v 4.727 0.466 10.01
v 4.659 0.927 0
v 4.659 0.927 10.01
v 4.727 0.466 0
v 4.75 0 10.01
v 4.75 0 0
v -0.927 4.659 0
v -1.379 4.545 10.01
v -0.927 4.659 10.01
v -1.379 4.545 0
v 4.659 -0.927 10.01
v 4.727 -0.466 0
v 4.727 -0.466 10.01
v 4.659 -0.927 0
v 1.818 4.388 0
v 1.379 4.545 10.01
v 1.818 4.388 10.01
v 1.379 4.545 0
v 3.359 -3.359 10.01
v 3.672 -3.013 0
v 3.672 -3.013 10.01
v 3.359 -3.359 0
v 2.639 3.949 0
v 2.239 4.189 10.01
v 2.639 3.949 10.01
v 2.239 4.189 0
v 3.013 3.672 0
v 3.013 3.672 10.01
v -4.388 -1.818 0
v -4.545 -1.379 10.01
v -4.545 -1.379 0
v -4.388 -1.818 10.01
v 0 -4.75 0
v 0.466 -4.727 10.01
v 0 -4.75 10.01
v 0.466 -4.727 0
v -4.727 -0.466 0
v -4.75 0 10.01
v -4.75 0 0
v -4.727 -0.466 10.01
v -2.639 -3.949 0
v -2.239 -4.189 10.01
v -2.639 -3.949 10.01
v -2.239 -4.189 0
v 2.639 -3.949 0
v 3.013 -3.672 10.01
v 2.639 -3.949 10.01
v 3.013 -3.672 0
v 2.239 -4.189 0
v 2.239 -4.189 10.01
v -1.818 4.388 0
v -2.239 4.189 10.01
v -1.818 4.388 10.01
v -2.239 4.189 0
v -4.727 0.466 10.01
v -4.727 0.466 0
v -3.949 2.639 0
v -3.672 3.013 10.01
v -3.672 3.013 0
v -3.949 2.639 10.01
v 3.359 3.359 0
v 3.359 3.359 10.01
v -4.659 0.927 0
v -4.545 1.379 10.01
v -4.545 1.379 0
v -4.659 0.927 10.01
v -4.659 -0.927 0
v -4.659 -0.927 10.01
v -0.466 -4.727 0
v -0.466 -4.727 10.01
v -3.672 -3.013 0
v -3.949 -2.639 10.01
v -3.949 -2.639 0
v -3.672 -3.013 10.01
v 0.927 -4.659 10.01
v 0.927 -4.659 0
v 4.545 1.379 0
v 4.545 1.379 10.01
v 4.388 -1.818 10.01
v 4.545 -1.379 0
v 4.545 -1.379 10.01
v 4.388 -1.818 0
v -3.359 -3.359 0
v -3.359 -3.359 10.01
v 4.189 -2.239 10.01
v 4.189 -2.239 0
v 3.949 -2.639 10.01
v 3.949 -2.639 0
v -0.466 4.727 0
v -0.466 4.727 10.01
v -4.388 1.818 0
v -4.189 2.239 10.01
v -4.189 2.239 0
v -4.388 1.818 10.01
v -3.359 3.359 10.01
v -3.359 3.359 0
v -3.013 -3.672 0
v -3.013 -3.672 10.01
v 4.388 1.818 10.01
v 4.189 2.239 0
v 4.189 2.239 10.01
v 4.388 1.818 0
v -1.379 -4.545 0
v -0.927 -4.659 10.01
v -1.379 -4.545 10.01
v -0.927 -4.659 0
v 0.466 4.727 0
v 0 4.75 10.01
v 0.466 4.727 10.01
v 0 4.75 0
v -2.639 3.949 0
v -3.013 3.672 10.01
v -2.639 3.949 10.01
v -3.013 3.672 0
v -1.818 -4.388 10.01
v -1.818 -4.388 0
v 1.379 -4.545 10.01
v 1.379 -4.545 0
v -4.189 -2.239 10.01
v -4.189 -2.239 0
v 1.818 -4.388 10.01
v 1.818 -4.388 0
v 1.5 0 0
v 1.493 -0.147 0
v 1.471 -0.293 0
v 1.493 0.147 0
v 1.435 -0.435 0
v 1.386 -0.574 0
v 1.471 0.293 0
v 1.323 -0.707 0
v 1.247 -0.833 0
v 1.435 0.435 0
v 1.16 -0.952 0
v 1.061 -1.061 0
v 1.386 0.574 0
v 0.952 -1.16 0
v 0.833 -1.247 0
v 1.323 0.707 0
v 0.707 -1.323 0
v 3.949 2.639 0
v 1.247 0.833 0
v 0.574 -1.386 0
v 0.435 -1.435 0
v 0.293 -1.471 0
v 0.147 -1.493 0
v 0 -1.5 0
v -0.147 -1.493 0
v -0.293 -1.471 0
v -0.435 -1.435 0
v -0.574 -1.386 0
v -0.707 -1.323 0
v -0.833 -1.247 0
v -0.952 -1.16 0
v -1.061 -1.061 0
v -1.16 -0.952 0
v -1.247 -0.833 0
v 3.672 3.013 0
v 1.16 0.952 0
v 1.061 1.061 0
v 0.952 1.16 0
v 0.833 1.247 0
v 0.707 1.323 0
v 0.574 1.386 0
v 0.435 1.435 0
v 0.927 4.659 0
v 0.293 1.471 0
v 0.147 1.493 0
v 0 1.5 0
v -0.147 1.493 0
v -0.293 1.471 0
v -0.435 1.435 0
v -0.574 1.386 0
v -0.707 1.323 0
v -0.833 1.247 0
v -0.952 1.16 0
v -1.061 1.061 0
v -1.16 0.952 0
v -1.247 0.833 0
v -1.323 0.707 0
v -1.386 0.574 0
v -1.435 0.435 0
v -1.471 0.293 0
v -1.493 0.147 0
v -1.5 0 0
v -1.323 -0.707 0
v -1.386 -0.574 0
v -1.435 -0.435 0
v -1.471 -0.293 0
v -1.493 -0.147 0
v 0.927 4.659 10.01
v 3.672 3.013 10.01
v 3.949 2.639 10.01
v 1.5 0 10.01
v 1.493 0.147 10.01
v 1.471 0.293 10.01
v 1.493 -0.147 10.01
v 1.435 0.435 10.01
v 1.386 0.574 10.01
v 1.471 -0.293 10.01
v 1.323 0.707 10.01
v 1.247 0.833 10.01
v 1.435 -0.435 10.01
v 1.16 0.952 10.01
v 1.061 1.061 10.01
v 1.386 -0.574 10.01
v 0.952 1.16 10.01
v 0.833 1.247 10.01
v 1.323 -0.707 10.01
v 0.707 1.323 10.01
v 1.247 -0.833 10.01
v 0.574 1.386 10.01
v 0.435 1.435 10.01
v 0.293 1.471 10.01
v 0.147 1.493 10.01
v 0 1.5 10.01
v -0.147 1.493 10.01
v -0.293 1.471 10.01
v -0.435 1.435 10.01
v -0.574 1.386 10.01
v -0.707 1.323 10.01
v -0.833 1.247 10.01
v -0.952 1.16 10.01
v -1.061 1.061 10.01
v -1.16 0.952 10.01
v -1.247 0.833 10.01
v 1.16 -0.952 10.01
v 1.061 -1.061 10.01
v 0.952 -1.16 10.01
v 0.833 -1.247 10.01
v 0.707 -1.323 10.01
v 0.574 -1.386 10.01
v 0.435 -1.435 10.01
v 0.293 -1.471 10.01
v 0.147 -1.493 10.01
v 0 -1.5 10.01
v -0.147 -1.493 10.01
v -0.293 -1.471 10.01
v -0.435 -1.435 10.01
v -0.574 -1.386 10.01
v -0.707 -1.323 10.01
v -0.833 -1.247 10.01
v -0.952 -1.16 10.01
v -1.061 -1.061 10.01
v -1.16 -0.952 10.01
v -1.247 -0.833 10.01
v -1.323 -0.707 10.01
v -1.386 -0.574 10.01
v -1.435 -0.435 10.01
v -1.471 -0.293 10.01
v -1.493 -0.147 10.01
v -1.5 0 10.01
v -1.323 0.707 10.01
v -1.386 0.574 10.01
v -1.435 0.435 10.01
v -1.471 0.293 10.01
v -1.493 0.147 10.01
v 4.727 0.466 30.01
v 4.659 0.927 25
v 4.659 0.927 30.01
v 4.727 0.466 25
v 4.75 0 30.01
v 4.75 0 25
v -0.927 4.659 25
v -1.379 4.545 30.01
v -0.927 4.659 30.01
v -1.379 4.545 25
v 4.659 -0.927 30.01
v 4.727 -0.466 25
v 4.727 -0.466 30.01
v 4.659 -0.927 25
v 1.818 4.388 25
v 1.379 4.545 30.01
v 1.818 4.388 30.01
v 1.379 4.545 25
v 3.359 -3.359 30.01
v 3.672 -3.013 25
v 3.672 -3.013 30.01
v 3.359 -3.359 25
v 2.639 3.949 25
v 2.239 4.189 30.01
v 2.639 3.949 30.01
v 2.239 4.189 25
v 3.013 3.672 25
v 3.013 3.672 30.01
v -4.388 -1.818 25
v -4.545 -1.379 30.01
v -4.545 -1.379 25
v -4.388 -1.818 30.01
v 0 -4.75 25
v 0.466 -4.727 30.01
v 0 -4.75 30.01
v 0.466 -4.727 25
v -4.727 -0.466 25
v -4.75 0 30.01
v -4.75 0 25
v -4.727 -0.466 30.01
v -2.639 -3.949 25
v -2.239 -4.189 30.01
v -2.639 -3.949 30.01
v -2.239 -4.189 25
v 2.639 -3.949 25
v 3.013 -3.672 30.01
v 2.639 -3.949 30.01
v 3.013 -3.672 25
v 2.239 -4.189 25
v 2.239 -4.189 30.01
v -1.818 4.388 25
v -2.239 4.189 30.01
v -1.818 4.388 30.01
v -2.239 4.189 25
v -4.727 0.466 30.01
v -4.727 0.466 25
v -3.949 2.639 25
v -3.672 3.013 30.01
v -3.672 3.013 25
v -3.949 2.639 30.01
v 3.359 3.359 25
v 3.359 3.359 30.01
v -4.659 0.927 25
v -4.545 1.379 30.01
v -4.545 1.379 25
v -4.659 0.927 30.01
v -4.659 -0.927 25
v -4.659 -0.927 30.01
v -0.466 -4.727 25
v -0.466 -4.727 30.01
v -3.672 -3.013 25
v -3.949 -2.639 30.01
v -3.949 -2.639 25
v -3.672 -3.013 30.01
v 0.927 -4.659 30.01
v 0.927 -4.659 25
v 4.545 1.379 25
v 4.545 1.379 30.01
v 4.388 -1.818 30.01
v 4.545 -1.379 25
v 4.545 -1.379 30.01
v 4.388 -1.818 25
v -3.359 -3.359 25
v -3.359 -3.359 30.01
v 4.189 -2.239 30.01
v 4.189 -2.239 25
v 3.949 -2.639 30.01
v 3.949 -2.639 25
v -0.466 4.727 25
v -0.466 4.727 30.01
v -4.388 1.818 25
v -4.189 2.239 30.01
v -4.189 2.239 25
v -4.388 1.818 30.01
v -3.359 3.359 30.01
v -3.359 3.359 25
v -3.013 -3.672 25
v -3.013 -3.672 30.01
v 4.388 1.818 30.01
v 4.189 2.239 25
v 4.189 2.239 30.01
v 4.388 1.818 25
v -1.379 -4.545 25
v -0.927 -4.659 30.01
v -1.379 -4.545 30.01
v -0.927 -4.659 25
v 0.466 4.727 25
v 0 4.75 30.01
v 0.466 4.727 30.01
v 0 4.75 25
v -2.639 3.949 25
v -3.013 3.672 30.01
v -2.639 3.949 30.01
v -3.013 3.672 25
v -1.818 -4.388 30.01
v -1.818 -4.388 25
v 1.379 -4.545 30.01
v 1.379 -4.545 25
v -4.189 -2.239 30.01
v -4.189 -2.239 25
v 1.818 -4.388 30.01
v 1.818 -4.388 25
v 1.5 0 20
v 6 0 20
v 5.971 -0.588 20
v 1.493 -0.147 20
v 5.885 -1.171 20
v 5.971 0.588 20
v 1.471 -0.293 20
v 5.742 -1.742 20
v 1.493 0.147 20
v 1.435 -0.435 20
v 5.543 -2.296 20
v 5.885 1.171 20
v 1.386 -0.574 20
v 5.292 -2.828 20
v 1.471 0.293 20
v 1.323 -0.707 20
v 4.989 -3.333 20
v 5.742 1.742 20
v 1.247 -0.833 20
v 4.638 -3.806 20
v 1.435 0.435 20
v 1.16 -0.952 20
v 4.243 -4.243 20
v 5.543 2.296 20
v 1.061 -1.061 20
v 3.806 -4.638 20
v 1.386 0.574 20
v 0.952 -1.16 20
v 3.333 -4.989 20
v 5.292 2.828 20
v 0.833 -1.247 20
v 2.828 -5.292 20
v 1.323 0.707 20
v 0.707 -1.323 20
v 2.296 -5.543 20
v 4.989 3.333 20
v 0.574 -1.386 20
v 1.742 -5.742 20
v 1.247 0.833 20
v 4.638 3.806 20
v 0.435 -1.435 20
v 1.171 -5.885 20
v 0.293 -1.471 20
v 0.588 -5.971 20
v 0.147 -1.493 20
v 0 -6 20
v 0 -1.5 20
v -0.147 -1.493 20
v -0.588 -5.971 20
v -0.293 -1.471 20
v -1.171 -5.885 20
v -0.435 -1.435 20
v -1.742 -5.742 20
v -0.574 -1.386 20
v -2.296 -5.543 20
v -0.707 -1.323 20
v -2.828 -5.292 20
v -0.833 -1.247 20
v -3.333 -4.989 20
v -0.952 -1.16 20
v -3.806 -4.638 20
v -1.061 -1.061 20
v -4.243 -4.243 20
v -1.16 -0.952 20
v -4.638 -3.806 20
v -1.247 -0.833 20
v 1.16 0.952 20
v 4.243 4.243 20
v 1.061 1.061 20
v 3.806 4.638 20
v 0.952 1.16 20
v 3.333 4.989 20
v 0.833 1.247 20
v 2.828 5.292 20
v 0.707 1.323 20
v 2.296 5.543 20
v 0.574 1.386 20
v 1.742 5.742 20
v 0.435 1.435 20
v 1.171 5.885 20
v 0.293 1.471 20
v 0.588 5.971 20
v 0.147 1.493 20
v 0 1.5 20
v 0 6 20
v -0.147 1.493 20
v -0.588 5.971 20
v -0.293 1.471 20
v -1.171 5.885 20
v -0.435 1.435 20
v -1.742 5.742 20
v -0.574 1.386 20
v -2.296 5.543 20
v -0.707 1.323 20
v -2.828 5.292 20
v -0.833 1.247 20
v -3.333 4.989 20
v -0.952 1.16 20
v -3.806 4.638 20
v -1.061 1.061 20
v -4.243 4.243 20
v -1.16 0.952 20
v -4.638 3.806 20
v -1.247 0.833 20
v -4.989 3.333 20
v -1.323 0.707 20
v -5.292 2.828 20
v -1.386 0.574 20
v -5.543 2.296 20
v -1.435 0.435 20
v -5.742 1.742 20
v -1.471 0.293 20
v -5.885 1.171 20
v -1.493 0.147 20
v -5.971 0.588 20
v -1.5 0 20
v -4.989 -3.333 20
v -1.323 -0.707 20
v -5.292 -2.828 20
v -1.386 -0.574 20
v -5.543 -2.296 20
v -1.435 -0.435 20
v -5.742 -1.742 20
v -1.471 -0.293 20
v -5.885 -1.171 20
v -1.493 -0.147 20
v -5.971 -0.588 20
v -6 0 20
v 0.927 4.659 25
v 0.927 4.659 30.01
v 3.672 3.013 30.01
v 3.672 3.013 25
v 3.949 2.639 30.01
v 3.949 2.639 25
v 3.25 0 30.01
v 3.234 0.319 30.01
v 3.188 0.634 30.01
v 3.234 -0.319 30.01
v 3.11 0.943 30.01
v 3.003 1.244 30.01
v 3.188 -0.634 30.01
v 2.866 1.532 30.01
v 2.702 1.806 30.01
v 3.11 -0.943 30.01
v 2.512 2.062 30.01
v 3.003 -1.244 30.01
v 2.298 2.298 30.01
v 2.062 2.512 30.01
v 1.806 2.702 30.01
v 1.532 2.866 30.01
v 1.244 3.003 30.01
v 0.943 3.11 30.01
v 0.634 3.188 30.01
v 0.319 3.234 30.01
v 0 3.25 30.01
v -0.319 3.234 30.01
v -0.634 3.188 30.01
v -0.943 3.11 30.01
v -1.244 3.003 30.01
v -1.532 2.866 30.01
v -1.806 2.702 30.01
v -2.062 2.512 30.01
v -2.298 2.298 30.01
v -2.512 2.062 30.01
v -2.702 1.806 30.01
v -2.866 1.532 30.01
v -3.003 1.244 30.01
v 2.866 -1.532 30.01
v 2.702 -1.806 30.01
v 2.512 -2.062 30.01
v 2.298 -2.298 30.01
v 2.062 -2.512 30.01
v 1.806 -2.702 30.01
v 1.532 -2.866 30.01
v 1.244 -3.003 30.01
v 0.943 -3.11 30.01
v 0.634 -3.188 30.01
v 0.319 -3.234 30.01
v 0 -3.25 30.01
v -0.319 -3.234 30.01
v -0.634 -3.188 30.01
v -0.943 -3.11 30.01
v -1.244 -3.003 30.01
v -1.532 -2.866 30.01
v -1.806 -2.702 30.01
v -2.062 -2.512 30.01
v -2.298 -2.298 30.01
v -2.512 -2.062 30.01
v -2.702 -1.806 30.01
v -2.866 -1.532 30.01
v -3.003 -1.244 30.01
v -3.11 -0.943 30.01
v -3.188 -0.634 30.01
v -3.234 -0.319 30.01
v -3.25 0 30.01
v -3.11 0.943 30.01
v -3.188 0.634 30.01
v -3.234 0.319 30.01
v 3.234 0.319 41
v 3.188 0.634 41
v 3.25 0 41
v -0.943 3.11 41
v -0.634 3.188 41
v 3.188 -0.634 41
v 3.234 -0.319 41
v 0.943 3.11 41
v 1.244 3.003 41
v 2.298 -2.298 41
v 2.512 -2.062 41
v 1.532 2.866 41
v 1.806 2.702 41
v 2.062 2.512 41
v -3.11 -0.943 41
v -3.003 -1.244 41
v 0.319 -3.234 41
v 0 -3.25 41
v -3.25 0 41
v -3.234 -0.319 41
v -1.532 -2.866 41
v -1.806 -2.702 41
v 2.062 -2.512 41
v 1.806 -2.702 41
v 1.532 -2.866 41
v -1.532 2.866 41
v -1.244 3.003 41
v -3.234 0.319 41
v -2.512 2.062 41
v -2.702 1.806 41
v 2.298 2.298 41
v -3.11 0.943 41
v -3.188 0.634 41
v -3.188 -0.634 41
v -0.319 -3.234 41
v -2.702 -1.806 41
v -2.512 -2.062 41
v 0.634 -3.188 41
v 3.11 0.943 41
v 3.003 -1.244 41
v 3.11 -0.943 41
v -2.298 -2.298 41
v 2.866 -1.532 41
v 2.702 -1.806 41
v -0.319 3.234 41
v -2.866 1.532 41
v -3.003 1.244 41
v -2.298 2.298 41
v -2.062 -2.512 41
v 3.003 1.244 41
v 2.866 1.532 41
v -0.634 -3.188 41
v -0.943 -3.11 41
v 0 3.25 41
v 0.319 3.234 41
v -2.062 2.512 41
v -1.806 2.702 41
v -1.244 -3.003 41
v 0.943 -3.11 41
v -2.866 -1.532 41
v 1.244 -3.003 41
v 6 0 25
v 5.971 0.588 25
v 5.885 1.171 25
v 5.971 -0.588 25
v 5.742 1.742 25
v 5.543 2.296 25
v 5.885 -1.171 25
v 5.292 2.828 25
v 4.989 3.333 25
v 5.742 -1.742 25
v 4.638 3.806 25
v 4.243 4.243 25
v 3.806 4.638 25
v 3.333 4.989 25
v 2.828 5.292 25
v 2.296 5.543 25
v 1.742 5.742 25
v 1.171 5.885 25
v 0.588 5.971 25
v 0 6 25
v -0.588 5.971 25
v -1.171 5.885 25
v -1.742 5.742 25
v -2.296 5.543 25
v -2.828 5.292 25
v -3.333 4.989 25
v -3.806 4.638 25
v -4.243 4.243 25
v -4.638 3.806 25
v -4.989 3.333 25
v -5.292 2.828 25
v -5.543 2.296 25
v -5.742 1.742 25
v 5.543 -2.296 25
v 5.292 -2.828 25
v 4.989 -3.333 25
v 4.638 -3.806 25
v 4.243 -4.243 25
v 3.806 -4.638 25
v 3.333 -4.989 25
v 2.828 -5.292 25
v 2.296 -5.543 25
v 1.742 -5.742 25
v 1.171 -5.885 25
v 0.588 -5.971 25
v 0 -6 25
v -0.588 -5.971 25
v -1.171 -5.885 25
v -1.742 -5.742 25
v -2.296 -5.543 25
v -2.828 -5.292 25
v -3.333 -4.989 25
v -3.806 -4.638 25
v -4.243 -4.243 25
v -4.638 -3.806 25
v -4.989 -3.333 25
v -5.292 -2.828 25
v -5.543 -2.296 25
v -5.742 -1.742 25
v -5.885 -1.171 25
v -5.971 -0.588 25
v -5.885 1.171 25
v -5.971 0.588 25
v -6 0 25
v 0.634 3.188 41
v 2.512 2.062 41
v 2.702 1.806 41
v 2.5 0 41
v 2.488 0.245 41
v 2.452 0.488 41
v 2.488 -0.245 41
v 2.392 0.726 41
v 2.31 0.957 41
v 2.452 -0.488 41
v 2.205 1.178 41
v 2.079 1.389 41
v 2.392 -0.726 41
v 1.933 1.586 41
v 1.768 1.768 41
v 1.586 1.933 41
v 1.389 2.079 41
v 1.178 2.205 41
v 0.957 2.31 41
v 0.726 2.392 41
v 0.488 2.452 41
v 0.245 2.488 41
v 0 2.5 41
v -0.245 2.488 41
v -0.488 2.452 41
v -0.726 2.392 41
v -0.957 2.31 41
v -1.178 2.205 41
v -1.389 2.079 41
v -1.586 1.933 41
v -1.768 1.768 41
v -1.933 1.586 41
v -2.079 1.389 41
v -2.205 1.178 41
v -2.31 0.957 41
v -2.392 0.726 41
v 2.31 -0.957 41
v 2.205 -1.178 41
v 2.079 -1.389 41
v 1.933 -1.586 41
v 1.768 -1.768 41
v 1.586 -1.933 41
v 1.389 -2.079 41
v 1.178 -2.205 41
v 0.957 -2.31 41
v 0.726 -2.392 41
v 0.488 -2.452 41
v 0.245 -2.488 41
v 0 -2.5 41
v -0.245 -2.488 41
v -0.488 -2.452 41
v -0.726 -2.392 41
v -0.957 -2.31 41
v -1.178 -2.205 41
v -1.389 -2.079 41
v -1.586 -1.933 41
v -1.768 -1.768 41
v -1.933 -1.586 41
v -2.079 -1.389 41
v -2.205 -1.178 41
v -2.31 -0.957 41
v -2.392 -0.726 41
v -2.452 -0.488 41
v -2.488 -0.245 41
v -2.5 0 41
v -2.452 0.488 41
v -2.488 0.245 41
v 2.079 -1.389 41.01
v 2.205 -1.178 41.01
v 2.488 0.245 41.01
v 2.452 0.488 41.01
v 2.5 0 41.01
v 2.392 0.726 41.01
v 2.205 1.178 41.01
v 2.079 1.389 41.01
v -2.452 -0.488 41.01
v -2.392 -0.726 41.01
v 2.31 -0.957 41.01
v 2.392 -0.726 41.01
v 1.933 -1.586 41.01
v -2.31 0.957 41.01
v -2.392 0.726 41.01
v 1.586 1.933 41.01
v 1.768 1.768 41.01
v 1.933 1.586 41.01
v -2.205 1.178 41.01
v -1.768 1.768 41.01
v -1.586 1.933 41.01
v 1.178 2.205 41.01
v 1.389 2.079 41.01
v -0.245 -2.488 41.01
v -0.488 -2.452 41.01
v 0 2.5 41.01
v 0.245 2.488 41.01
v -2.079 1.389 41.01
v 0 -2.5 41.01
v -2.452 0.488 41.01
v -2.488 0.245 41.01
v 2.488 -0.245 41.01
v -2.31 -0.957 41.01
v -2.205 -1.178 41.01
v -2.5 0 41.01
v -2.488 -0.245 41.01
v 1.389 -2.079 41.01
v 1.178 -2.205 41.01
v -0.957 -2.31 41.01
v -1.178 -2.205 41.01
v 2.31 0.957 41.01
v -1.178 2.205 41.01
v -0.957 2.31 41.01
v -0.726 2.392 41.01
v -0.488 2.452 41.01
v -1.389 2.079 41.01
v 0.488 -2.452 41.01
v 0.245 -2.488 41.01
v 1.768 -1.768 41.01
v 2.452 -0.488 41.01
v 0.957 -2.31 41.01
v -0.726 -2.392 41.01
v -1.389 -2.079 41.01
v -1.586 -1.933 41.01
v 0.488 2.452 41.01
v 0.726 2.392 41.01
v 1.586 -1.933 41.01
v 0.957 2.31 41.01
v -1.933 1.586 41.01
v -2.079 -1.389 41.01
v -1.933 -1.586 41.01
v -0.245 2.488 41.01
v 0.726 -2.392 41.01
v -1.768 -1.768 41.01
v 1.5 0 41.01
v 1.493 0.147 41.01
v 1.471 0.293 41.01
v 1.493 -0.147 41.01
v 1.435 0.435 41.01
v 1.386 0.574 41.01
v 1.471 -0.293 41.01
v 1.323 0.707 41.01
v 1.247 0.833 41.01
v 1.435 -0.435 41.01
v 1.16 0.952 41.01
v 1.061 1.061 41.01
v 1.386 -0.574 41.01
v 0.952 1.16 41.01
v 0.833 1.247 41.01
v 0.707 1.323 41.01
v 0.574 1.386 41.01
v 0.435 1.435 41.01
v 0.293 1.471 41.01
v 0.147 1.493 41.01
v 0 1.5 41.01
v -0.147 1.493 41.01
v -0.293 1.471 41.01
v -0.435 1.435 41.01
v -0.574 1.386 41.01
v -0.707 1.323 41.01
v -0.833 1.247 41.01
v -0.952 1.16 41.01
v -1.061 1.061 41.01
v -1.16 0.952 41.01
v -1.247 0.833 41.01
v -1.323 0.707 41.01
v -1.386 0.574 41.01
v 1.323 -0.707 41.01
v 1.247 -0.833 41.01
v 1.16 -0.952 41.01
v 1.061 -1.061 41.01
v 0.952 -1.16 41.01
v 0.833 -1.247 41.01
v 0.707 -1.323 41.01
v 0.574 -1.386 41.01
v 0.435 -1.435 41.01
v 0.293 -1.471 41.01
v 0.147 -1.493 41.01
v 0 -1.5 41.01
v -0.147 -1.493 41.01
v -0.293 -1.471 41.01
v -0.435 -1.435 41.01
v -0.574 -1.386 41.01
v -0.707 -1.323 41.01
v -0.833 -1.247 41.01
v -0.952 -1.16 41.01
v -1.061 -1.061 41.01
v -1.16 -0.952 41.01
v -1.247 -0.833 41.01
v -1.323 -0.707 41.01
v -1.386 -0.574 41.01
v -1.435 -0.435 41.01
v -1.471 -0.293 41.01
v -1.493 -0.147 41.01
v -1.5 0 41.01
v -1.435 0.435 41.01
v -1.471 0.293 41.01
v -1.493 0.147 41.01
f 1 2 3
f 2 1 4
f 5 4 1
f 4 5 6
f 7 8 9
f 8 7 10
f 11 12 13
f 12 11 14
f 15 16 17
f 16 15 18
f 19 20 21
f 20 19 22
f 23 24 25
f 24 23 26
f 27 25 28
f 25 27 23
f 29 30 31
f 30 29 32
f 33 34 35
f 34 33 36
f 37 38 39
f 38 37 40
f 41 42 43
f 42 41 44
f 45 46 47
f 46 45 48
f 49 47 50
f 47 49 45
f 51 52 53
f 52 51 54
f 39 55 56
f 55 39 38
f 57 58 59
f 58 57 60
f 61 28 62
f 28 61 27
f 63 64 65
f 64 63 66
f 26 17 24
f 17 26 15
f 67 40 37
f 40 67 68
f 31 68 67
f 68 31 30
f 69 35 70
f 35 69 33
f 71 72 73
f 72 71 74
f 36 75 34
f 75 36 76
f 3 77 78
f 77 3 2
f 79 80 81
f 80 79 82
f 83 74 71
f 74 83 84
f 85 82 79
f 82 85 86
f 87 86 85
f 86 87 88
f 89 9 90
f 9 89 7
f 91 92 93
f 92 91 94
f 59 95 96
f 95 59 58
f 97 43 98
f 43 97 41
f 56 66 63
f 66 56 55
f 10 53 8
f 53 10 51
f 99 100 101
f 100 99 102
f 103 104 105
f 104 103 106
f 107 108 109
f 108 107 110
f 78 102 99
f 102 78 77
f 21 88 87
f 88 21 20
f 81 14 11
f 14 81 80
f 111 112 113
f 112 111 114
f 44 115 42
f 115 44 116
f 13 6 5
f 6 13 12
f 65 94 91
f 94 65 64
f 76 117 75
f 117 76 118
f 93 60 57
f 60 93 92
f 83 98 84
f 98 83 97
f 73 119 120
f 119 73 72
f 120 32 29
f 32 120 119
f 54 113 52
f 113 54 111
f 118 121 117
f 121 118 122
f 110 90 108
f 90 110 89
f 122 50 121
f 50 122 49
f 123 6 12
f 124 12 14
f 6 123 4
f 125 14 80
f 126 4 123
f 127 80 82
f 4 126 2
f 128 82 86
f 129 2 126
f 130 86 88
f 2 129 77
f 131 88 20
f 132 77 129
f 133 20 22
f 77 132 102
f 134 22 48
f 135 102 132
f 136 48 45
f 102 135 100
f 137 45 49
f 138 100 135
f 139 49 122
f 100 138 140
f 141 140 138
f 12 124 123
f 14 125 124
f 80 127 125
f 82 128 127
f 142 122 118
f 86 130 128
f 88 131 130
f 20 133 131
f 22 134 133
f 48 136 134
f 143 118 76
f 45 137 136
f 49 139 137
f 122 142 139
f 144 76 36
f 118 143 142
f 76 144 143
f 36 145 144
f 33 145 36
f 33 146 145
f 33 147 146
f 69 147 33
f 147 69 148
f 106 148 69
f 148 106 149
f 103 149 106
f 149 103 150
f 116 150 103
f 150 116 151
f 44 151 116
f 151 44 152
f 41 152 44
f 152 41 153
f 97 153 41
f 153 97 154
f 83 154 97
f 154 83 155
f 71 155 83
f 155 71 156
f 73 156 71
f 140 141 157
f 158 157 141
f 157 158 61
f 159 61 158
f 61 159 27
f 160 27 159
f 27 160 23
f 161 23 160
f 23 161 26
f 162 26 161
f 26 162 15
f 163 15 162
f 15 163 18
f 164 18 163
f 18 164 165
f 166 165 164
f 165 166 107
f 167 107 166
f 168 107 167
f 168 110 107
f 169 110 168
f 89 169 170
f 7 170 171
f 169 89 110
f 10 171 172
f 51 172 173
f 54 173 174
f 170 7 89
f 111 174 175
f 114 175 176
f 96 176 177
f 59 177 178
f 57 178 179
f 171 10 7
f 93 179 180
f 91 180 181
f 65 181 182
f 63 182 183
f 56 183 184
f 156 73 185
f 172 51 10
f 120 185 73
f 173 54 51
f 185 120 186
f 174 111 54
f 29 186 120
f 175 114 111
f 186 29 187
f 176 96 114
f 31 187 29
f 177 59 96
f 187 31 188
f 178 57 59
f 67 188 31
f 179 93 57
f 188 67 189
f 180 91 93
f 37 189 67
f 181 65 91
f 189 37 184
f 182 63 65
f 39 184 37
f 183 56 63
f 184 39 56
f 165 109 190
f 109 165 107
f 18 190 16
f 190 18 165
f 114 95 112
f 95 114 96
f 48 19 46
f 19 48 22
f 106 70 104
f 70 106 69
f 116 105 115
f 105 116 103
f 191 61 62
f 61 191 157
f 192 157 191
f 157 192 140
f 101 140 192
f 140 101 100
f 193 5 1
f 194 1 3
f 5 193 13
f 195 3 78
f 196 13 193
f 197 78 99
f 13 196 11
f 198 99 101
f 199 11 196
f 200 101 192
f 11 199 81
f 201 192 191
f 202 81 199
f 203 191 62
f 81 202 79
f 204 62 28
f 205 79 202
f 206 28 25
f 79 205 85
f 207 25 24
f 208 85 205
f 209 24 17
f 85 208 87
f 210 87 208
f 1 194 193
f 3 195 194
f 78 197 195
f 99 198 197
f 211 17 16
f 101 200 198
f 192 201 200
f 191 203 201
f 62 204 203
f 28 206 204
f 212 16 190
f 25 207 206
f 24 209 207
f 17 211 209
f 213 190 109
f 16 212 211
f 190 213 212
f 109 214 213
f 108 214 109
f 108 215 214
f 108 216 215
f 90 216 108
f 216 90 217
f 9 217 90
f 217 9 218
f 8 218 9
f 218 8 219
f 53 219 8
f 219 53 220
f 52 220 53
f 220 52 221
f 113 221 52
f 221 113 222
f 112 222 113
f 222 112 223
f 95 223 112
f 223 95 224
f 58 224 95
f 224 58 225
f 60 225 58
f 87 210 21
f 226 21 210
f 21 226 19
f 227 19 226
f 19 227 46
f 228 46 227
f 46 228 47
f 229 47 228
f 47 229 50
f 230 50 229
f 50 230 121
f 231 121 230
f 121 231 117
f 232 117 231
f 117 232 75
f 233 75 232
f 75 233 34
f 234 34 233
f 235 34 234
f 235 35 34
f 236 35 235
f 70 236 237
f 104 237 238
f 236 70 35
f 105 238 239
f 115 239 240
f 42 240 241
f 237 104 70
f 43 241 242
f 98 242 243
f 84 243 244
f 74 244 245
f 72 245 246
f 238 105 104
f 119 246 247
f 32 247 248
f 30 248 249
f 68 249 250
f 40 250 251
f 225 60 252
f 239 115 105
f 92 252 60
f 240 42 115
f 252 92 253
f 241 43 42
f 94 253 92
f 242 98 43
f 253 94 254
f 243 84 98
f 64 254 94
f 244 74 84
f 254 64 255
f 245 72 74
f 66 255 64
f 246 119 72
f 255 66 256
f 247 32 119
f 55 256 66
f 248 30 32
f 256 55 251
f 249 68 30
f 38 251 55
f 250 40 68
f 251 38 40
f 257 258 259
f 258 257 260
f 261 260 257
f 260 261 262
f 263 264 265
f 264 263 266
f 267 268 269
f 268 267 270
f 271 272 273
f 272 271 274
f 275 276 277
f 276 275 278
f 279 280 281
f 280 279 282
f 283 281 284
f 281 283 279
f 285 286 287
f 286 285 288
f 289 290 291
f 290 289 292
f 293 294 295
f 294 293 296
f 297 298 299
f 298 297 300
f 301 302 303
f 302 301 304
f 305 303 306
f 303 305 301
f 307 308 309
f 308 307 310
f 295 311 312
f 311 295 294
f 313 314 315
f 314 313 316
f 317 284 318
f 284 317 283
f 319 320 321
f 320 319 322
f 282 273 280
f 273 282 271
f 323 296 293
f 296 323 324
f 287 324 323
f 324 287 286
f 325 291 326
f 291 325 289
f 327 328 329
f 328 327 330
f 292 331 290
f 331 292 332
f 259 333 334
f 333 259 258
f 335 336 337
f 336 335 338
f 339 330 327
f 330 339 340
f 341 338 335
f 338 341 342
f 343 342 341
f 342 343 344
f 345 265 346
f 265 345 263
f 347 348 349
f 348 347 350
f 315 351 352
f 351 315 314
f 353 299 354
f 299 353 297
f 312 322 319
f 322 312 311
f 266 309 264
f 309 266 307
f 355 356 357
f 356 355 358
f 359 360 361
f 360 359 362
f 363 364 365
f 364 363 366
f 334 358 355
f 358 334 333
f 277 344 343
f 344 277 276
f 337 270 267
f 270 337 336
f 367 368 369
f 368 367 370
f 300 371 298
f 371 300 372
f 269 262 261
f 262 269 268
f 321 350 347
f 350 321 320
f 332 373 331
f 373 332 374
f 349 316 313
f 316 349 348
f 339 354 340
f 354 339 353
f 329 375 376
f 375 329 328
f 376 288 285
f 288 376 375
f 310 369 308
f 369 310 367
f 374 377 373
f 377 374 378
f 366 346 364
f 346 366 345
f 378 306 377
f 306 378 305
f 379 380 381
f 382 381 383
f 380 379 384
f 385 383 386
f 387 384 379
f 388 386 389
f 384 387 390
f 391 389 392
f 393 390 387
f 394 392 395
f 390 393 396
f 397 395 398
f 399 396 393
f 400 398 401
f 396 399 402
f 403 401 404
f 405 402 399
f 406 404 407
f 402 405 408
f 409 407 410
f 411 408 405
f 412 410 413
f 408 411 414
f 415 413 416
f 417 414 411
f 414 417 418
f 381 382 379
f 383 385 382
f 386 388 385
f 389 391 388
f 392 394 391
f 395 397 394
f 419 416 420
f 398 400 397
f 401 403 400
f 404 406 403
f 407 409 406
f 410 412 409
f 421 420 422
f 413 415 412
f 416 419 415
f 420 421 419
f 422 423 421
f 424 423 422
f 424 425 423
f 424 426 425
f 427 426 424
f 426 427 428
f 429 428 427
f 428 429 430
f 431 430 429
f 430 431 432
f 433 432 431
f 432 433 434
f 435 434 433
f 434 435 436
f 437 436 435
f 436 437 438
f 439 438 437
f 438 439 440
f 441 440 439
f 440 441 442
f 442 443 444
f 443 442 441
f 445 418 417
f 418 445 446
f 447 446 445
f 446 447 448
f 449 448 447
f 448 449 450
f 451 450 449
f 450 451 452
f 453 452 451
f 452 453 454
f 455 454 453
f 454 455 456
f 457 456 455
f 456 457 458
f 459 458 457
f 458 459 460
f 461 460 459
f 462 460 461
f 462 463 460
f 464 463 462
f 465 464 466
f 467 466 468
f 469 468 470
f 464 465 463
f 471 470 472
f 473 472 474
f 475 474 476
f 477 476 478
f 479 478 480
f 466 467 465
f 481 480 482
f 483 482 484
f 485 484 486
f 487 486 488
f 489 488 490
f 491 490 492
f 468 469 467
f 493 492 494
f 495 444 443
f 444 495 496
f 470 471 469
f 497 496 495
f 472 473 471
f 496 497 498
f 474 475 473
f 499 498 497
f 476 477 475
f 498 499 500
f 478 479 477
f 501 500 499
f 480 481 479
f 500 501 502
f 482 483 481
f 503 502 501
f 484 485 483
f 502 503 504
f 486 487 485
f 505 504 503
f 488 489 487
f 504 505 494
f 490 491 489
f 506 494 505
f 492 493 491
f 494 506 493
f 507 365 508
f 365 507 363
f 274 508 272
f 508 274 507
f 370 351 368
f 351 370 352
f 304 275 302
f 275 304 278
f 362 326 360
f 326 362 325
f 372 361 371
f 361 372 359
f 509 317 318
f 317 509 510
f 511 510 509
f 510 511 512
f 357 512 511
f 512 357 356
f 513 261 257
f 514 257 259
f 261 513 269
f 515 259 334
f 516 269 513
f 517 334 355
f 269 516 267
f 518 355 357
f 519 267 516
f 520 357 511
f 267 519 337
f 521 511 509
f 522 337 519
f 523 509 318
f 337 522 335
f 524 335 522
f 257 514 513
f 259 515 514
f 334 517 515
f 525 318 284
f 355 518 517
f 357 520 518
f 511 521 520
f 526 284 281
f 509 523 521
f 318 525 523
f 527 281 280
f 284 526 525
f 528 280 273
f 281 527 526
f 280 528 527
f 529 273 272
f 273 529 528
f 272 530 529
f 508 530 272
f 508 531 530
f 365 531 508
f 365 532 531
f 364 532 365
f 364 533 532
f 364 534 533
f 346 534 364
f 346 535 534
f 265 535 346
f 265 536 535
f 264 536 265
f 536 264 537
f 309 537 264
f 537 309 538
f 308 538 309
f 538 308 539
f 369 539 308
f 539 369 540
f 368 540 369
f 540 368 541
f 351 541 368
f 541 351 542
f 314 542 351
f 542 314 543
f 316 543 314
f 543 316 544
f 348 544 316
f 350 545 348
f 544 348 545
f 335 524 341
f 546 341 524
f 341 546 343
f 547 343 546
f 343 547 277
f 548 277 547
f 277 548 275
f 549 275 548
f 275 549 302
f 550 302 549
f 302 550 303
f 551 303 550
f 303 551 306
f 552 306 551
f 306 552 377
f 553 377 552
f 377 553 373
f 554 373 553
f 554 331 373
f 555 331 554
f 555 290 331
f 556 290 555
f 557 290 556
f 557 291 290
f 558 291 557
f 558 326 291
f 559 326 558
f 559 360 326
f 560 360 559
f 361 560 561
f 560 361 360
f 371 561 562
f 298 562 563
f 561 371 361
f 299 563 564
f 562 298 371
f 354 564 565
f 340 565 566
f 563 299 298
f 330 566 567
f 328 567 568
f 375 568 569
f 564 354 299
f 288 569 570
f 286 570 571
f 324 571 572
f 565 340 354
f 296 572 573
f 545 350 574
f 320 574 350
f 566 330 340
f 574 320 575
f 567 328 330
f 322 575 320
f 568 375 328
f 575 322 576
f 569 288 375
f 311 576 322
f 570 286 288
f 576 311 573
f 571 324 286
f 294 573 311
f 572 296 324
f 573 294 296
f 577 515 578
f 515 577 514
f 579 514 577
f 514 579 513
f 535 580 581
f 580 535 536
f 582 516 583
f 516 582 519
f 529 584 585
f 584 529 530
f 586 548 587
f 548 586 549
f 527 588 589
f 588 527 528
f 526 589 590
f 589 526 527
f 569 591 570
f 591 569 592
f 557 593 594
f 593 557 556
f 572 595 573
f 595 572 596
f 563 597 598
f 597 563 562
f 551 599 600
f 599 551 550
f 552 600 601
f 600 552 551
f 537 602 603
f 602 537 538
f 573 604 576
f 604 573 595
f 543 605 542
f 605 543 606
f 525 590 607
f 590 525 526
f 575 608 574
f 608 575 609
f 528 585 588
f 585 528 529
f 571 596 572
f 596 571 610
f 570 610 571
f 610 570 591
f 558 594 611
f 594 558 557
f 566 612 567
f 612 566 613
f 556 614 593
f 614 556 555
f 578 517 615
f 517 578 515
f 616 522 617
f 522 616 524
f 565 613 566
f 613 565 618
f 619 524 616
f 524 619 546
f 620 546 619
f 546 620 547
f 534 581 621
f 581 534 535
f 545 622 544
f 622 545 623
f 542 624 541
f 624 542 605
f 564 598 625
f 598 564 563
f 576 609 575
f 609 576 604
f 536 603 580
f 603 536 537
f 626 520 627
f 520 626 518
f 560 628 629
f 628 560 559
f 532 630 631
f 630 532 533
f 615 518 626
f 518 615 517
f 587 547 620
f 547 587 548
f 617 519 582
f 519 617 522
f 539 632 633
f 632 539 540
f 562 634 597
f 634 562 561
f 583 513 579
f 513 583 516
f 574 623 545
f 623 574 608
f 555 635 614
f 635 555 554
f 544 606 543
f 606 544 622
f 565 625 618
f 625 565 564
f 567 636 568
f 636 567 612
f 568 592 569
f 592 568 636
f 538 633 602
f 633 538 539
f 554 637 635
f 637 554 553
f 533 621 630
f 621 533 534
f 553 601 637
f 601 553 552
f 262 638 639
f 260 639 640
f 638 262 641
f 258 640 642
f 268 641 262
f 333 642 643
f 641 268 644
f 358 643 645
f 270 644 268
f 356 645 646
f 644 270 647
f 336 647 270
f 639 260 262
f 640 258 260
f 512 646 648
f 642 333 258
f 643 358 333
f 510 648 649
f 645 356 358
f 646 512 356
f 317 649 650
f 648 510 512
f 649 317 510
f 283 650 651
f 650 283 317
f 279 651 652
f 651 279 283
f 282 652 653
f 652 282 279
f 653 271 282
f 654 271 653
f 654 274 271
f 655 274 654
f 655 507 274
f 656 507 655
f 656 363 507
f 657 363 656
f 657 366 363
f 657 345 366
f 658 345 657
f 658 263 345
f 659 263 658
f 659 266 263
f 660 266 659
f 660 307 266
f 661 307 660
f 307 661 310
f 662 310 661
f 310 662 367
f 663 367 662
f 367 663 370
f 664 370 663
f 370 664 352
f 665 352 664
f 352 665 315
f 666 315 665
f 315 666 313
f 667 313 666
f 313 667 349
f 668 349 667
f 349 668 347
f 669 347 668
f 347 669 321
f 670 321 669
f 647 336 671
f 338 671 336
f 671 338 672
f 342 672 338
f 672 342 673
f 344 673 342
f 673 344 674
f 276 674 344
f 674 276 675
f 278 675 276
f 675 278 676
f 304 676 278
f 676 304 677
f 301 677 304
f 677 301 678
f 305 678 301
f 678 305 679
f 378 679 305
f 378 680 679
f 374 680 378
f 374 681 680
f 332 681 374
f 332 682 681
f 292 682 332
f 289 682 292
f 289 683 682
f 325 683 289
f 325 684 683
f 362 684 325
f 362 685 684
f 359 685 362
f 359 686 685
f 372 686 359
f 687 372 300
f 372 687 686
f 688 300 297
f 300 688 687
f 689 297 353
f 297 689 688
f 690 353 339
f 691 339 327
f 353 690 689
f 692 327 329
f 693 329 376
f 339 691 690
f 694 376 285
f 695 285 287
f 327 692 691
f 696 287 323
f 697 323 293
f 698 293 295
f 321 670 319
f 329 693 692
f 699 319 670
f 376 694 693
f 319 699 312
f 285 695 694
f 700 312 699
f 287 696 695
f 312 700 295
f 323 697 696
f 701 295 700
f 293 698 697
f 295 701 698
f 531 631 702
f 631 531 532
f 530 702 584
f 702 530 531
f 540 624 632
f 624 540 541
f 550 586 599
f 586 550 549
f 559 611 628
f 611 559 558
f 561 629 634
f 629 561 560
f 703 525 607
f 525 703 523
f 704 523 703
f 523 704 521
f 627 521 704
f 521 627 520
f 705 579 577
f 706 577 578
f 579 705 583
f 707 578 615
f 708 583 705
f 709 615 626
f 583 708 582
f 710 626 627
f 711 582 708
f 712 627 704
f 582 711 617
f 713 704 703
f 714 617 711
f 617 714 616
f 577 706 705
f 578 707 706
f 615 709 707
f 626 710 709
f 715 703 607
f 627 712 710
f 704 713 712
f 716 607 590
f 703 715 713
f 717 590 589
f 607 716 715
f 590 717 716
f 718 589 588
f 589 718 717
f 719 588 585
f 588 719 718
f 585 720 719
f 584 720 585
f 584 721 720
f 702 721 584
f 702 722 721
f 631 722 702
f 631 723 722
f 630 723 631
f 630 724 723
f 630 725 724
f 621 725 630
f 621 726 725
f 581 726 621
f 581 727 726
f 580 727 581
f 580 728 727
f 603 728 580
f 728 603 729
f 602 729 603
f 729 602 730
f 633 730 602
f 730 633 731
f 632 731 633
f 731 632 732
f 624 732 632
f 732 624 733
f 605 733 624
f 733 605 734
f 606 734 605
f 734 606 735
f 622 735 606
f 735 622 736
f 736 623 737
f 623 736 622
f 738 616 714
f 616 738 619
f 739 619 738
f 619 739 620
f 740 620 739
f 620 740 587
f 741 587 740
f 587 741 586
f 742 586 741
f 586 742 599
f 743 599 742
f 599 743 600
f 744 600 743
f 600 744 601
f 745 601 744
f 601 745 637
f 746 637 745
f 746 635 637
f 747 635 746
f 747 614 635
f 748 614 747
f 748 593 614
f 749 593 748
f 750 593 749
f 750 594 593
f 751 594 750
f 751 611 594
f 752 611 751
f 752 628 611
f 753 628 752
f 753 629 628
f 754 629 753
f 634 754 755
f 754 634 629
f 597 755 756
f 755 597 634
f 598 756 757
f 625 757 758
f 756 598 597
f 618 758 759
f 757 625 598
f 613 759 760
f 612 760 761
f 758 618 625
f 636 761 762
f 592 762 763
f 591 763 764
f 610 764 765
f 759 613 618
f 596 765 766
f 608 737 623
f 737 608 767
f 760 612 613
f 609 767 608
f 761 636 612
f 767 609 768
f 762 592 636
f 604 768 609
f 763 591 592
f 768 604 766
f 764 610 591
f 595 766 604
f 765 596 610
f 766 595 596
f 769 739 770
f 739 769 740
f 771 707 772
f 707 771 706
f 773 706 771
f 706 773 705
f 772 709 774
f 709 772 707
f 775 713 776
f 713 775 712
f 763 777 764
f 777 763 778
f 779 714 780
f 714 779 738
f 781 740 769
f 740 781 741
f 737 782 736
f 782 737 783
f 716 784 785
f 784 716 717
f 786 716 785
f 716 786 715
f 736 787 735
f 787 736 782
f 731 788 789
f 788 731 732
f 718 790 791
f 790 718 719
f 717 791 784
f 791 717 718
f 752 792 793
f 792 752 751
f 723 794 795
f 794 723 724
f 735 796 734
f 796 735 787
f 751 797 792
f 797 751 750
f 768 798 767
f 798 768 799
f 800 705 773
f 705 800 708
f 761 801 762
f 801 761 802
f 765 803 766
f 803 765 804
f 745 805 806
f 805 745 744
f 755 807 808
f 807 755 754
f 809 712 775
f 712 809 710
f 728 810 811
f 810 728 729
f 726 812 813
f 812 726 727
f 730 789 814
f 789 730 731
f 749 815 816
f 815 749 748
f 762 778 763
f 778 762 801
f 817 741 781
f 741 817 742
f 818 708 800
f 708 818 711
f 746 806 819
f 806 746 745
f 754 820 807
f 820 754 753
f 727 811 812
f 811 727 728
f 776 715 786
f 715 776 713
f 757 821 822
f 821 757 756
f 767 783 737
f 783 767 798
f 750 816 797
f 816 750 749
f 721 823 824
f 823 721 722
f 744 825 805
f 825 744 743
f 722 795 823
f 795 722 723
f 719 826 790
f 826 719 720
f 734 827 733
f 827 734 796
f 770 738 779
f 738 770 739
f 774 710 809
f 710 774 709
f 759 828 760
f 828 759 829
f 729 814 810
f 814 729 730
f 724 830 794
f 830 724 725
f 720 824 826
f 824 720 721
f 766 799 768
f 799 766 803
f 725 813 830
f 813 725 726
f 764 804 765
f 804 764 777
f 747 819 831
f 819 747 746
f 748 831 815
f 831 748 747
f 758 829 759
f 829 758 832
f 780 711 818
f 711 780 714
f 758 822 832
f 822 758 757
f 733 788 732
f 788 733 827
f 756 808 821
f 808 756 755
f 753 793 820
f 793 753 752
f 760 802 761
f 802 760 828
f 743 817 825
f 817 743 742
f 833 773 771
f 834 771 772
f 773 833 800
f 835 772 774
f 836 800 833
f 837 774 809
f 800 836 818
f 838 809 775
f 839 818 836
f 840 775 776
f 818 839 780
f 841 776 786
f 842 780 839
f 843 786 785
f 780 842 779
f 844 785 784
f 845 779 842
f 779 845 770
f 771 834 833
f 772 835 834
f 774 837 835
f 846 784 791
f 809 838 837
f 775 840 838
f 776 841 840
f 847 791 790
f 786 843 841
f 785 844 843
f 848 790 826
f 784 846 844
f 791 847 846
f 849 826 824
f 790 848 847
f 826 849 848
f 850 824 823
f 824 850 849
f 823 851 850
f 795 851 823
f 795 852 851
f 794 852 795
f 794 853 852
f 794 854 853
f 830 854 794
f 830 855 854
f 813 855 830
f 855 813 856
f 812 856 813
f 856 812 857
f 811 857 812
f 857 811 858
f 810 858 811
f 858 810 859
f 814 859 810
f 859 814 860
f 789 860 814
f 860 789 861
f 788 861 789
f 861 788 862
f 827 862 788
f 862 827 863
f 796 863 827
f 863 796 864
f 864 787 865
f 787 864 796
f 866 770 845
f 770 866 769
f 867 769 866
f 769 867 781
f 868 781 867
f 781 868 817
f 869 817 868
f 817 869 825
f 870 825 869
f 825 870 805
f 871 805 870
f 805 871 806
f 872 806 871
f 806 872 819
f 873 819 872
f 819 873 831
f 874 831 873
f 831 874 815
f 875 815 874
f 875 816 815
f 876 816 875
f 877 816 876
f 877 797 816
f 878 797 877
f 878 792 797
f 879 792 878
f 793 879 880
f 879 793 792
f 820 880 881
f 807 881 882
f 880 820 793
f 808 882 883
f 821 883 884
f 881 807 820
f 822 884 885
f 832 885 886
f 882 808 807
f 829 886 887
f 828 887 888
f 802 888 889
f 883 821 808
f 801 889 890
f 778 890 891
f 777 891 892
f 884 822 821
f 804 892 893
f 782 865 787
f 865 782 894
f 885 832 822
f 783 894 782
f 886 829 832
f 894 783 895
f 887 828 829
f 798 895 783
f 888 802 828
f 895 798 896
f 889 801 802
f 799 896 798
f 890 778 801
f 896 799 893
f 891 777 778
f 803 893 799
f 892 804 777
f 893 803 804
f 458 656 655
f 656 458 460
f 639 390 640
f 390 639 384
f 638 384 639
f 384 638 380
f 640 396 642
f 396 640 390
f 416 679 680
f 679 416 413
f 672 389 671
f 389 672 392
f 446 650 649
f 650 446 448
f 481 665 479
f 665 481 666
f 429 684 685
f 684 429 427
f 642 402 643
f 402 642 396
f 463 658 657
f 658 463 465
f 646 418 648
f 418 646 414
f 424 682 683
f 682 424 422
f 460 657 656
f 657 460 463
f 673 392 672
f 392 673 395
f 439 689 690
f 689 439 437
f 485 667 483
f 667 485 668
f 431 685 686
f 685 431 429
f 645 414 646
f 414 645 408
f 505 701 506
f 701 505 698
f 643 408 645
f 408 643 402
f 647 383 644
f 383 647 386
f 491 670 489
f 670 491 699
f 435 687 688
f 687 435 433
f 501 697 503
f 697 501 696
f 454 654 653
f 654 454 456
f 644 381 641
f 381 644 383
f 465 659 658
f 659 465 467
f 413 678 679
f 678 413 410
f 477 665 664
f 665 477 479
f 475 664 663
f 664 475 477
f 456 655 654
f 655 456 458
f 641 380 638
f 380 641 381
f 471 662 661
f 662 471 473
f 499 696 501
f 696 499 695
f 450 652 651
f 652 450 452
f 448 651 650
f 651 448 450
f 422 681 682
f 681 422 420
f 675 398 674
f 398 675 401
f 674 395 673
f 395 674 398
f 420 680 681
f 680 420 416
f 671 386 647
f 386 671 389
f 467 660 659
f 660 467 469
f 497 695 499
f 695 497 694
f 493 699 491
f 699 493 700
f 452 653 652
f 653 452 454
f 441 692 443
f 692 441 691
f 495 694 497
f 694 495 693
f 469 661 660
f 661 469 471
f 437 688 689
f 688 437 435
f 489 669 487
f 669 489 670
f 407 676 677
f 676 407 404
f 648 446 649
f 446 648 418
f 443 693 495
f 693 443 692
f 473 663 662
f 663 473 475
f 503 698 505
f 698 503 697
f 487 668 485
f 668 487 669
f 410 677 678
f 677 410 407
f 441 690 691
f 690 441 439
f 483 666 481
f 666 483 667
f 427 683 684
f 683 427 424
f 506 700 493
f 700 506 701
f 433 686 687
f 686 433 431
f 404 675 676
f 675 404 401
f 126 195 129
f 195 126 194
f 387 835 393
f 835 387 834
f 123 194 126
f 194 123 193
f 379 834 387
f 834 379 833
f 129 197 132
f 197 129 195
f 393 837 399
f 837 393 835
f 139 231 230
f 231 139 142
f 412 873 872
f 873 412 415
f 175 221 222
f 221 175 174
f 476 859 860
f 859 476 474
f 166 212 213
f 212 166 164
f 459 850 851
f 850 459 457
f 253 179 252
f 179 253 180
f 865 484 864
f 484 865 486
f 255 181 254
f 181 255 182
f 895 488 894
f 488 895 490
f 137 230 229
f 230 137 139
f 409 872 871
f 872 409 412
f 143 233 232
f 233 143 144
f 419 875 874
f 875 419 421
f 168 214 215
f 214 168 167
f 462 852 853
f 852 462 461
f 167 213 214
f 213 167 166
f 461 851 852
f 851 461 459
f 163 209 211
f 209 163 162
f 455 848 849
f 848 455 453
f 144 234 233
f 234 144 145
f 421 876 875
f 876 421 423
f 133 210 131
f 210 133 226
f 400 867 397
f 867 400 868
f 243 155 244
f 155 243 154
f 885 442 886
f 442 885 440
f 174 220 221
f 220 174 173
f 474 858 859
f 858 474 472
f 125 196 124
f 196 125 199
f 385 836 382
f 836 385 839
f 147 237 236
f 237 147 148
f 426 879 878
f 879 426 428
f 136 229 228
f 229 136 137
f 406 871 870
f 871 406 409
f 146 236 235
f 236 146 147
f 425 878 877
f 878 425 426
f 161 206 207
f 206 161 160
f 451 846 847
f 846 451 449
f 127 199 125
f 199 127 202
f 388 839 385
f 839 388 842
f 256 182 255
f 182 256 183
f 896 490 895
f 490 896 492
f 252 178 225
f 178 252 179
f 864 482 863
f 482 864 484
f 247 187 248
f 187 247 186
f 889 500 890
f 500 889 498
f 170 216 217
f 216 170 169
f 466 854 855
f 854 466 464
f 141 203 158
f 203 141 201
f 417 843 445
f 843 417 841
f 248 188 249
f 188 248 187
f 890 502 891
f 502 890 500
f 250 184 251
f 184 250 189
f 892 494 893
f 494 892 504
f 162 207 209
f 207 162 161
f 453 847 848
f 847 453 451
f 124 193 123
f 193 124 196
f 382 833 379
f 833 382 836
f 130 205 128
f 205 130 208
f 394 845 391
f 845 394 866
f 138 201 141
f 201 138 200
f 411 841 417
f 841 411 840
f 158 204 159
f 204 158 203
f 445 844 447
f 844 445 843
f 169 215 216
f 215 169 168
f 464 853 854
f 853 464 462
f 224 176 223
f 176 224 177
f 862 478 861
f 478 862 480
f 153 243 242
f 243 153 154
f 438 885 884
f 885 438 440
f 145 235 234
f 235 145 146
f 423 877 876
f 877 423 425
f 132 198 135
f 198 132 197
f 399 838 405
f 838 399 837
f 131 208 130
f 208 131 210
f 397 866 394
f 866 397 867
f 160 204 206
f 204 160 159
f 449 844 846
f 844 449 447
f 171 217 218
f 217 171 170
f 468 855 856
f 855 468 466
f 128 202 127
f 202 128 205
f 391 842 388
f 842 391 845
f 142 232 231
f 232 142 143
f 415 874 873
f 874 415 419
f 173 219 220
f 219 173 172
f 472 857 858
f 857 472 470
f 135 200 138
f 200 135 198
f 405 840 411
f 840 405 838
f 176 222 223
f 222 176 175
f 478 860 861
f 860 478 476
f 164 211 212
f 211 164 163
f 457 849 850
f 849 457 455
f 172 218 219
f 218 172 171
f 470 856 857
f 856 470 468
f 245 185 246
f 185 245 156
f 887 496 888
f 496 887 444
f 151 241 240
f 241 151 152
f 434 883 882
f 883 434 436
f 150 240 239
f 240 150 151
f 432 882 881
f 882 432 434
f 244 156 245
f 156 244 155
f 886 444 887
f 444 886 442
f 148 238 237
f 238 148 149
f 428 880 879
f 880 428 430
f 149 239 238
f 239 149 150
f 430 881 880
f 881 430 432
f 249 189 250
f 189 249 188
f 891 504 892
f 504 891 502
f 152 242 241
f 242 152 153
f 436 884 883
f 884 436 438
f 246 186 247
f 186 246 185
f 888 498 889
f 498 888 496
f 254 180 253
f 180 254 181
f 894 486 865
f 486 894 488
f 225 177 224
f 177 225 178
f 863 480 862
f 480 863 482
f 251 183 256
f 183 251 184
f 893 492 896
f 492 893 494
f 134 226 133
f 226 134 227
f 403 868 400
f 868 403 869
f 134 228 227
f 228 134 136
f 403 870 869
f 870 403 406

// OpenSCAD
// Hose barb reducer - a straight reduction spool with a through bore that carries two stacked
// barbs for one tubing size into two stacked barbs for a smaller size, with a collar near the
// transition. NOVEL general part (a generic reducer, not any one labware item).
//

t1   = 8;
t2   = 5;
bore = 3;
L    = 41;
g    = 1.5;          // clearance between stacked barbs

$fn = 64;

barb_d1 = t1 + 2 * g;
barb_d2 = t2 + 2 * g;

module barb(h, d_top, d_base) {
    d_base = max(d_base, d_top);                 // keep the base the wider end
    linear_extrude(h) circle(d = d_base);
    translate([0, 0, h - 0.01]) cylinder(h = 0.02, d = d_top);   // tip protrudes just past the face
}

difference() {
    union() {
        for (z = [0, 20])
            translate([0, 0, z]) barb(h = 10, d_top = 9.5, d_base = 7.5);      // upper size
        translate([0, 0, 20]) cylinder(h = 5, d = 12);                         // collar
        for (z = [25, 33])
            translate([0, 0, z]) barb(h = 8, d_top = 5, d_base = 6.5);          // lower size
    }
    translate([0, 0, -1]) cylinder(h = L + 2, d = bore);
}
